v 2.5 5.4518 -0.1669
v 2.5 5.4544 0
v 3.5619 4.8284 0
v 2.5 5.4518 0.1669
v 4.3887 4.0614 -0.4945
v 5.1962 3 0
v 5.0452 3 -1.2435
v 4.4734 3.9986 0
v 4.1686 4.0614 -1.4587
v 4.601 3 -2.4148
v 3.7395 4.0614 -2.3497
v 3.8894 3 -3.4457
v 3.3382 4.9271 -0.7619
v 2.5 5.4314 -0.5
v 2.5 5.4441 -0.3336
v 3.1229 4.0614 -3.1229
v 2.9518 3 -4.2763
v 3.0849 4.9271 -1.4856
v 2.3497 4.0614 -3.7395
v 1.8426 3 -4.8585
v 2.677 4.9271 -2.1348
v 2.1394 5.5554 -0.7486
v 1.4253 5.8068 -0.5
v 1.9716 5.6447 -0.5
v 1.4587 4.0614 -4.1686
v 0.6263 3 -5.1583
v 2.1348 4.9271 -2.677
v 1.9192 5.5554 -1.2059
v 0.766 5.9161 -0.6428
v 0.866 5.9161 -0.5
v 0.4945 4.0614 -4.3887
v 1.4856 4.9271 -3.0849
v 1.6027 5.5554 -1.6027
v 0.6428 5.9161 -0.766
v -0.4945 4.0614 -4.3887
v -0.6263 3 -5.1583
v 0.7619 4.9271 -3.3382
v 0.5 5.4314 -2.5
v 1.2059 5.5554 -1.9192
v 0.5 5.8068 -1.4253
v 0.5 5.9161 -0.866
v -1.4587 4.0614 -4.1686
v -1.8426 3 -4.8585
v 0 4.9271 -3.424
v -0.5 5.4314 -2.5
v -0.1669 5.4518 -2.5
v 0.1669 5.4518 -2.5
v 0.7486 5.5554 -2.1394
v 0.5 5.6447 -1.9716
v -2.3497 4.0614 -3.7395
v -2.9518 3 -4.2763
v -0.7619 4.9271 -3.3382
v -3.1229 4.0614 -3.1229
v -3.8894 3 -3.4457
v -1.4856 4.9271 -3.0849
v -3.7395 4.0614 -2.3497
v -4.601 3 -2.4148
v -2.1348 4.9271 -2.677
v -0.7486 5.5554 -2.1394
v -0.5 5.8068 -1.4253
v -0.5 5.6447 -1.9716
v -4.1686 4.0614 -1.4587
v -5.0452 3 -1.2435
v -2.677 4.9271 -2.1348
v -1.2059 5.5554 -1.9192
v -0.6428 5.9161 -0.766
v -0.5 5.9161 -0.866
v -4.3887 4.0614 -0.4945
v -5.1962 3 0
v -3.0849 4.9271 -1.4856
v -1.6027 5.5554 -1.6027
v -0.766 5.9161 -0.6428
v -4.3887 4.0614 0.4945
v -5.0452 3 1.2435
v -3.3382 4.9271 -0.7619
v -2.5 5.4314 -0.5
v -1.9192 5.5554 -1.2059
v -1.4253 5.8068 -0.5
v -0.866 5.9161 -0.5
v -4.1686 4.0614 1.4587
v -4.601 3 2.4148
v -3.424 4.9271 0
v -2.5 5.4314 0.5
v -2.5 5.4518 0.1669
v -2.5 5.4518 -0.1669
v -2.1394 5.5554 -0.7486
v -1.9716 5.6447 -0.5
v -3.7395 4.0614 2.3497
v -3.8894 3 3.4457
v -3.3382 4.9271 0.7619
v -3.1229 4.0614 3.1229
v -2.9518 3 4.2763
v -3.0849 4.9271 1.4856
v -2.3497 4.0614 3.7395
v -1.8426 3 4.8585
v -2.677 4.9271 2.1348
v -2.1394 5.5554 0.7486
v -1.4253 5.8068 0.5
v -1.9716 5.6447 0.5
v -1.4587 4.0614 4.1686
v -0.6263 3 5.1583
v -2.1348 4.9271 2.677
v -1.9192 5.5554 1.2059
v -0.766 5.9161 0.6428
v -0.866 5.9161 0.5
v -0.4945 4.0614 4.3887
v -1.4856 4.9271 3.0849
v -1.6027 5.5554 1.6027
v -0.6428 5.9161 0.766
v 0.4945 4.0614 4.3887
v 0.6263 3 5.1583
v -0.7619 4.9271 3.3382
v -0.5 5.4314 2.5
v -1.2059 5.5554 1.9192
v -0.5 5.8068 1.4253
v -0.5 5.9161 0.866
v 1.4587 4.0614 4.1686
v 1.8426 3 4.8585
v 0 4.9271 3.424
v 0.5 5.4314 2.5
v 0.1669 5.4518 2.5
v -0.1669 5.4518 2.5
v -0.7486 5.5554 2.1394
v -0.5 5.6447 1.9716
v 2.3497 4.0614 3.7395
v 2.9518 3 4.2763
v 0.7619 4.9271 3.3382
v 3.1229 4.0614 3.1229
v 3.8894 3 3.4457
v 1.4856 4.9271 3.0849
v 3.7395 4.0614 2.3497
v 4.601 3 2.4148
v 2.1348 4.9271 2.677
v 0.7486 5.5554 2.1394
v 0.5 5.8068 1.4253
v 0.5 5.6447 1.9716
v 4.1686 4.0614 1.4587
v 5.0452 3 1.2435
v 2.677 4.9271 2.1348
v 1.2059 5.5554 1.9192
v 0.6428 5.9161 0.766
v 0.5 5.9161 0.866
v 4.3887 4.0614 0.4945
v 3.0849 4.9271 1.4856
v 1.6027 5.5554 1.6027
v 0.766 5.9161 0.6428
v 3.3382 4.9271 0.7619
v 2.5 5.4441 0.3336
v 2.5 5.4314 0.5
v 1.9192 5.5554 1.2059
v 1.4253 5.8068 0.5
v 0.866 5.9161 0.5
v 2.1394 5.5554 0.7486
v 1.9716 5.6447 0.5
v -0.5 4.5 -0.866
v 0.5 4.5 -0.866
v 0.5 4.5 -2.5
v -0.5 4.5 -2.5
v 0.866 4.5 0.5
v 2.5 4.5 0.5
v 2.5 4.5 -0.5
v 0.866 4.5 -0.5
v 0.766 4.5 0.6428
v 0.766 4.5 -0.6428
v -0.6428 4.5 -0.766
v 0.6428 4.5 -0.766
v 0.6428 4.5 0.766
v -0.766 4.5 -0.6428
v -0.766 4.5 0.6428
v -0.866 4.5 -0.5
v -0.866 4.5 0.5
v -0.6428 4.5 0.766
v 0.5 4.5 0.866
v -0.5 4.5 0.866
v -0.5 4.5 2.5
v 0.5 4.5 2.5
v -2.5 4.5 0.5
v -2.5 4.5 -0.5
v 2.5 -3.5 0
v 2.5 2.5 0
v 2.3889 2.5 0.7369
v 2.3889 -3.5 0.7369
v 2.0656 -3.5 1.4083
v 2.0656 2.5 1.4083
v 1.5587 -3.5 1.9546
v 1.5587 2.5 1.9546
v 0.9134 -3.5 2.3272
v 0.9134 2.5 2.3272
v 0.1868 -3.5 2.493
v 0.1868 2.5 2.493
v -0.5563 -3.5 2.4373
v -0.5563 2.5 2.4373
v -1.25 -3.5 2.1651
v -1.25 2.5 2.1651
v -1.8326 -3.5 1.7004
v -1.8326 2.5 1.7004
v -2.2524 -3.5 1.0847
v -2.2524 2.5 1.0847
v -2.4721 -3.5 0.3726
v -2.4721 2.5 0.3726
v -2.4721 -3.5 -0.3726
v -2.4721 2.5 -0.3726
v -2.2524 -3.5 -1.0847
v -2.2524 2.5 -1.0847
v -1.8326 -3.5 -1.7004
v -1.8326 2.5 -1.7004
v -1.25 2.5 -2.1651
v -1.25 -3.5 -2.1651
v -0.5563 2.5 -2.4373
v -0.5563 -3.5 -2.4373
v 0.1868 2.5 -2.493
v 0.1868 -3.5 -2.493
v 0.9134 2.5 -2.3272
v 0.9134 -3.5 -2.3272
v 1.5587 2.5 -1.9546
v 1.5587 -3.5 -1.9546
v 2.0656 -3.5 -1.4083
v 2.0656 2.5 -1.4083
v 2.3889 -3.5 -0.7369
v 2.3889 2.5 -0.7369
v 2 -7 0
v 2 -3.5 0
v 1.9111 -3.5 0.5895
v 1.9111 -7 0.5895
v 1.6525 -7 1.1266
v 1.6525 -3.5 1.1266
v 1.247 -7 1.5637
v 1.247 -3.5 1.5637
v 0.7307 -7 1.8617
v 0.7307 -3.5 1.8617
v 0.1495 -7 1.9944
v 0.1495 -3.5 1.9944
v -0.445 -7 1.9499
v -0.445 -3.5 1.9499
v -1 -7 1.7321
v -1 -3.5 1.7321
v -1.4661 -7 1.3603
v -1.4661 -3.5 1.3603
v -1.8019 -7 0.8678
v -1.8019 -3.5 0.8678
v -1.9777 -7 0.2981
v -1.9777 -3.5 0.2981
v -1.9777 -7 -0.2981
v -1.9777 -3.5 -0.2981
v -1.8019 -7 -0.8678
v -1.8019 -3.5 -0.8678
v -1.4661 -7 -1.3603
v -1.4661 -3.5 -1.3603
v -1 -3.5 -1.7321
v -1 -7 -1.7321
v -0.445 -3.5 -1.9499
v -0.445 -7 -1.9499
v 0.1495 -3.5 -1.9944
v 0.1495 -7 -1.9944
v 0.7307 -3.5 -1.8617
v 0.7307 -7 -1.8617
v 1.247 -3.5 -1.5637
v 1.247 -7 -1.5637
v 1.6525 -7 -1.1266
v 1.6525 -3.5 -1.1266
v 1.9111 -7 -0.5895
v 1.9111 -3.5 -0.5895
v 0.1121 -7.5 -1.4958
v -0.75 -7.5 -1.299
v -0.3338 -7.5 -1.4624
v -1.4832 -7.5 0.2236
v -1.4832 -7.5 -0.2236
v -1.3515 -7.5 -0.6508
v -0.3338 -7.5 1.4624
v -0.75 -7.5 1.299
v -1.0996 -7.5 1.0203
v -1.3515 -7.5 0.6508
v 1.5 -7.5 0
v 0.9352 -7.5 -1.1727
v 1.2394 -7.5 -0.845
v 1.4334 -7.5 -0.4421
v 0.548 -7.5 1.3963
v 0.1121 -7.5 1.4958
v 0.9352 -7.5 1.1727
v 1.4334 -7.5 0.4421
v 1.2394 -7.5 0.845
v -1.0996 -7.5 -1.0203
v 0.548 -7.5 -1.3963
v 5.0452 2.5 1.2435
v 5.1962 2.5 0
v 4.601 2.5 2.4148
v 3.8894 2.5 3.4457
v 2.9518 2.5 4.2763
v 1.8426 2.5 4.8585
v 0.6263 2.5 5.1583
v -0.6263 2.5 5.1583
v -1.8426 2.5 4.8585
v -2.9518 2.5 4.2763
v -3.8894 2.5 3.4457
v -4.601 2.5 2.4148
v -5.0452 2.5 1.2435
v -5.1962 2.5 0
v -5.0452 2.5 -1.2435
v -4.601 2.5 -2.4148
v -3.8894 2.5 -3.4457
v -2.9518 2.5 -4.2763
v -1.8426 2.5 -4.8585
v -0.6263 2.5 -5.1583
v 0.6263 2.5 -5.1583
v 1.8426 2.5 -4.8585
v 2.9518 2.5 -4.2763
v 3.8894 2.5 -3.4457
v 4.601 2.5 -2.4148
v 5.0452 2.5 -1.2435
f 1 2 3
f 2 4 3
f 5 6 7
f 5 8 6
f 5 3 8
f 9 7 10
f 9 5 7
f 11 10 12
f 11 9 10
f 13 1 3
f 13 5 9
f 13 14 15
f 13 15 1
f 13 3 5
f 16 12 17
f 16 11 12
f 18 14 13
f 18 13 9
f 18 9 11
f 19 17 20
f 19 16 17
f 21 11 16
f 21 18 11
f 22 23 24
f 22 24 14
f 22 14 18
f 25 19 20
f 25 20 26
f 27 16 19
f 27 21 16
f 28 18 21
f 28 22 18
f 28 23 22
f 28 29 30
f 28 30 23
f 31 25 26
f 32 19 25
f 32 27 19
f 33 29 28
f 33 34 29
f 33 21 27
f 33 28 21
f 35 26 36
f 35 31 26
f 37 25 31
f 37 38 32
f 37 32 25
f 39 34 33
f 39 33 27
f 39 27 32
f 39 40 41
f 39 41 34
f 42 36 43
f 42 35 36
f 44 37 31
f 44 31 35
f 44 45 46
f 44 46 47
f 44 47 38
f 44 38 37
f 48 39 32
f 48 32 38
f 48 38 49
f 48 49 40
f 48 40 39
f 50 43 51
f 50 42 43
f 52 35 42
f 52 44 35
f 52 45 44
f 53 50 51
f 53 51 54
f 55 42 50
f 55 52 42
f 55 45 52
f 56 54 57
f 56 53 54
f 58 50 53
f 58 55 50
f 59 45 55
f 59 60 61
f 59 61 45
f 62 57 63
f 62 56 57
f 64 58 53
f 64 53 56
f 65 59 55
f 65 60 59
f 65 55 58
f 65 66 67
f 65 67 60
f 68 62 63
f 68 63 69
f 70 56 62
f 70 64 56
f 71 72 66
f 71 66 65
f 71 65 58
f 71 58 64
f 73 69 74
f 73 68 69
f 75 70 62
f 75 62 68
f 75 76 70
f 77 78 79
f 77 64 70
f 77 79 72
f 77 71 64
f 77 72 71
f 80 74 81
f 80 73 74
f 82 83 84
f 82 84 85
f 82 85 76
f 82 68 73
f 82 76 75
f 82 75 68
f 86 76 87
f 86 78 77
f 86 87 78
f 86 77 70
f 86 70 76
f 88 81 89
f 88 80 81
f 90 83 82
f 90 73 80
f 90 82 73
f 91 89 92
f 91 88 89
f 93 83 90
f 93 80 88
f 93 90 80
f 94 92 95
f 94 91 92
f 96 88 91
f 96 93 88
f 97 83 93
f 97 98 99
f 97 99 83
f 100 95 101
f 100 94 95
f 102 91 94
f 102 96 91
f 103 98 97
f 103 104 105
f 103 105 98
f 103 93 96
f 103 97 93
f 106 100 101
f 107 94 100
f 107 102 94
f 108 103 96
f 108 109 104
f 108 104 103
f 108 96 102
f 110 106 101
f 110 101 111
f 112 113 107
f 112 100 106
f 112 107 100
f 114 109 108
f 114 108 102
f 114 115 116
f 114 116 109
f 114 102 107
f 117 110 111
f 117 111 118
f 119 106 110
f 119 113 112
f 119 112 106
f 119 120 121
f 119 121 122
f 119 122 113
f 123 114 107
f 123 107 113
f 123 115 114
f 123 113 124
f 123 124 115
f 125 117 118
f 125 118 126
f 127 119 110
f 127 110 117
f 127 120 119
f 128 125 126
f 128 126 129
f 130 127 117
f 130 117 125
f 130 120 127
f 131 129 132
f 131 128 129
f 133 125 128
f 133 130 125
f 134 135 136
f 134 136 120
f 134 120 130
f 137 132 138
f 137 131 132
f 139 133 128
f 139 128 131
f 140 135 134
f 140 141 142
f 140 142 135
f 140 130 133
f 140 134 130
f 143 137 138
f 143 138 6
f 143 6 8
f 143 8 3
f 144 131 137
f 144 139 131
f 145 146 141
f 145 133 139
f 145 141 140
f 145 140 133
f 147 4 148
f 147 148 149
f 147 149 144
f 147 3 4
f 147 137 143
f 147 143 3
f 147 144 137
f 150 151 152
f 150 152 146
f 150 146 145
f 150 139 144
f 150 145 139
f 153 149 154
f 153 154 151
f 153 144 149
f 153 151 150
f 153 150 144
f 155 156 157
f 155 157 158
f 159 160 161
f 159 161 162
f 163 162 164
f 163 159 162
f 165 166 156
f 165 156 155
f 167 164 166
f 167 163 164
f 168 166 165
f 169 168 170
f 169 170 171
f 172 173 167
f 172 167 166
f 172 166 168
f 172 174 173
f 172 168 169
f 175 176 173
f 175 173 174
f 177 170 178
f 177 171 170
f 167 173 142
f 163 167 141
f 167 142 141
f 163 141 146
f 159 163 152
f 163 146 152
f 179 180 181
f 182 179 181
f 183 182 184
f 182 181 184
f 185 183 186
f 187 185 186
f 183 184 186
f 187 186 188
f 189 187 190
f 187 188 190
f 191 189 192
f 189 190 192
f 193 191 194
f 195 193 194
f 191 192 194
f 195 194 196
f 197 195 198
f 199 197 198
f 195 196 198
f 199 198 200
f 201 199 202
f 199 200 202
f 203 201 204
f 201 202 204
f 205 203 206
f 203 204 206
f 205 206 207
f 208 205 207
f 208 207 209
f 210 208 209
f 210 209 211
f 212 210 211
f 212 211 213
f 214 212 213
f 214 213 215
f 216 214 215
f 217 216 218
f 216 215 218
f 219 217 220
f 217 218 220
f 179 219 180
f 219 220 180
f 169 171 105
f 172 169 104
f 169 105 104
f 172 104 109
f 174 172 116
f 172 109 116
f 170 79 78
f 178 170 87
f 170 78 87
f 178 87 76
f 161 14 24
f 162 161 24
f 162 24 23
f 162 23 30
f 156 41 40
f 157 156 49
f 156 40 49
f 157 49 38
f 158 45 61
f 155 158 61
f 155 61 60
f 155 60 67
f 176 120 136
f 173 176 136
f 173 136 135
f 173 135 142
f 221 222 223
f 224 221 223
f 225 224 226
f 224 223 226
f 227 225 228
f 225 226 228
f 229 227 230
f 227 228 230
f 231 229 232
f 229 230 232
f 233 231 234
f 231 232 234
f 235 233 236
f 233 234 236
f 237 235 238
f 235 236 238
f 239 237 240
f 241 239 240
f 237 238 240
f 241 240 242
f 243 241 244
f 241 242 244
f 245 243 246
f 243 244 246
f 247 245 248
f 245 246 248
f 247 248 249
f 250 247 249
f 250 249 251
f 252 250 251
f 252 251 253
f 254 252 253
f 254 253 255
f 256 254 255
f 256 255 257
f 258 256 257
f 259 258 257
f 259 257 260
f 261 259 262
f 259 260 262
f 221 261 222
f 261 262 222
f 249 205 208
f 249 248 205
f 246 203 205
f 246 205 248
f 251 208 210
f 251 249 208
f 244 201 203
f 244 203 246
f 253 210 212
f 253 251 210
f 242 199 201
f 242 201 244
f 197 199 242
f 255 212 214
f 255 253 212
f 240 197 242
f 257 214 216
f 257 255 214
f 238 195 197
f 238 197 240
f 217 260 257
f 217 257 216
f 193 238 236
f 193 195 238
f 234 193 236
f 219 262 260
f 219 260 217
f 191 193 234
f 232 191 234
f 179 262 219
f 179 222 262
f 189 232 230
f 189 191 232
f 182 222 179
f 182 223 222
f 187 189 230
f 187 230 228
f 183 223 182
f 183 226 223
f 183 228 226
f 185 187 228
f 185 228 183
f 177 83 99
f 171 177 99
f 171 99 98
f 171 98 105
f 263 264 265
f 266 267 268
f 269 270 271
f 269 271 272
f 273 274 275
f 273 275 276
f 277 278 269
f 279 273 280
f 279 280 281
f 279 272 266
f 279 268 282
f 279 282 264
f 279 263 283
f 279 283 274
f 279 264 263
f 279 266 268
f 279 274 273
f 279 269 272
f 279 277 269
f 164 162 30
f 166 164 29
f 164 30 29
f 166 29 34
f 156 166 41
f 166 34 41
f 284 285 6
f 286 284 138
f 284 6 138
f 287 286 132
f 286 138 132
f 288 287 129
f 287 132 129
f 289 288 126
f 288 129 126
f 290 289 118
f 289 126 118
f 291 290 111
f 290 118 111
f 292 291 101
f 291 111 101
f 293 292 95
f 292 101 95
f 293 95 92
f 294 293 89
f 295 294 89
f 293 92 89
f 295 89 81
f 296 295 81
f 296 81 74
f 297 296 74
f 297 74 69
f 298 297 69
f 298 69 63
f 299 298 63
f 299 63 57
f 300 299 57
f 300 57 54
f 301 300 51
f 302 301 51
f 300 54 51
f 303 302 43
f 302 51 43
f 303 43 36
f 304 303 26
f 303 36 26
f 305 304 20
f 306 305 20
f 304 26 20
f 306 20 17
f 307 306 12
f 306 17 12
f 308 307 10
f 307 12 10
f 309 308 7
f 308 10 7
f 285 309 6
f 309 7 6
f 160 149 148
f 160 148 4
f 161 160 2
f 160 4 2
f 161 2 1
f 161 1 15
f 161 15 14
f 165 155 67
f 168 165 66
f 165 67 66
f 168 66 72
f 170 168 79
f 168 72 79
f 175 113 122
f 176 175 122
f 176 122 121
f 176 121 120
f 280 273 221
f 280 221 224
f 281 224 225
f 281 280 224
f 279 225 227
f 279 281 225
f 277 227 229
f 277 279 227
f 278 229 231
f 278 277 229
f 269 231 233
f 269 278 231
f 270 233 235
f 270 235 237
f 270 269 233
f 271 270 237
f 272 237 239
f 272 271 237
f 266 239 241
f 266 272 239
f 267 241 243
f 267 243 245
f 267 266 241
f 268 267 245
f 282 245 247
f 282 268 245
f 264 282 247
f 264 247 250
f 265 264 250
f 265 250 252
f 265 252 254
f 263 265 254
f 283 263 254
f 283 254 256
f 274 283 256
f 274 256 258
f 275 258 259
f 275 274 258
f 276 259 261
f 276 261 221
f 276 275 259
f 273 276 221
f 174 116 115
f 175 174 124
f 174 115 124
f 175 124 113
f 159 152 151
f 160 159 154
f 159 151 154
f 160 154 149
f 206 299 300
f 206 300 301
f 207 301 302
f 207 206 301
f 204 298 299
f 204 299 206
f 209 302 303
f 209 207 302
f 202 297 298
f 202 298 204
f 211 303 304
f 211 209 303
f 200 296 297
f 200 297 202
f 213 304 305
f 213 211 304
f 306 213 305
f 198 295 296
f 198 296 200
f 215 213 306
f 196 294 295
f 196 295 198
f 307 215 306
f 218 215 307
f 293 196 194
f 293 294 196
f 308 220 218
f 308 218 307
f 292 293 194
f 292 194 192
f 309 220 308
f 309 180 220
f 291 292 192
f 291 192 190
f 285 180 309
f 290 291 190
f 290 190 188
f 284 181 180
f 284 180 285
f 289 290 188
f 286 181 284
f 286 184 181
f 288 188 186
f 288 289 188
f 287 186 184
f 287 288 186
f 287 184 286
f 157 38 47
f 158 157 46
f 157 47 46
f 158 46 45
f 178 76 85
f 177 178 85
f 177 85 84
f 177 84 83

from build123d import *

# Parameters (mm, degrees)
ESQUISSE2_R             = 5.196152423
BOSS_EXTRU_1_DEPTH      = 0.5
ESQUISSE3_R             = 2.5
BOSS_EXTRU_2_DEPTH      = 6
ESQUISSE4_R             = 2
BOSS_EXTRU_3_DEPTH      = 4
CHANFREIN1_SIZE         = 0.5
ENL_V_MAT_EXTRU_2_DEPTH = 2


with BuildPart() as part:
    # Esquisse1 → Base-Révolution (revolve)
    with BuildSketch(Plane.XY):
        with BuildLine():
            Line((0, 3), (5.196152423, 3))
            ThreePointArc((5.196152423, 3), (3, 5.196152423), (0, 6))
            Line((0, 6), (0, 3))
        make_face()
    revolve(axis=Axis((0, 0, 0), (0, 1, 0)))

    # Esquisse2 → Boss.-Extru.1 (add)
    with BuildSketch(Plane.XZ.offset(-3)):
        Circle(ESQUISSE2_R)
    extrude(amount=BOSS_EXTRU_1_DEPTH)

    # Esquisse3 → Boss.-Extru.2 (add)
    with BuildSketch(Plane.XZ.offset(-2.5)):
        Circle(ESQUISSE3_R)
    extrude(amount=BOSS_EXTRU_2_DEPTH)

    # Esquisse4 → Boss.-Extru.3 (add)
    with BuildSketch(Plane.XZ.offset(3.5)):
        Circle(ESQUISSE4_R)
    extrude(amount=BOSS_EXTRU_3_DEPTH)

    # Chanfrein1
    chanfrein1_edges = [part.edges().sort_by_distance(p)[0] for p in [
        (-2, -7.5, 0),
    ]]
    chamfer(chanfrein1_edges, length=CHANFREIN1_SIZE)

    # Esquisse5 → Enlèv. mat.-Extru.2 (cut)
    with BuildSketch(Plane.XZ.offset(-6.5)):
        with BuildLine():
            Line((-0.5, -2.5), (-0.5, -0.866025404))
            ThreePointArc((-0.5, -0.866025404), (-0.707106781, -0.707106781), (-0.866025404, -0.5))
            Line((-0.866025404, -0.5), (-2.5, -0.5))
            Line((-2.5, -0.5), (-2.5, 0.5))
            Line((-2.5, 0.5), (-0.866025404, 0.5))
            ThreePointArc((-0.866025404, 0.5), (-0.707106781, 0.707106781), (-0.5, 0.866025404))
            Line((-0.5, 0.866025404), (-0.5, 2.5))
            Line((-0.5, 2.5), (0.5, 2.5))
            Line((0.5, 2.5), (0.5, 0.866025404))
            ThreePointArc((0.5, 0.866025404), (0.707106781, 0.707106781), (0.866025404, 0.5))
            Line((0.866025404, 0.5), (2.5, 0.5))
            Line((2.5, 0.5), (2.5, -0.5))
            Line((2.5, -0.5), (0.866025404, -0.5))
            ThreePointArc((0.866025404, -0.5), (0.707106781, -0.707106781), (0.5, -0.866025404))
            Line((0.5, -0.866025404), (0.5, -2.5))
            Line((0.5, -2.5), (-0.5, -2.5))
        make_face()
    extrude(amount=ENL_V_MAT_EXTRU_2_DEPTH, mode=Mode.SUBTRACT)


solid = part.part
